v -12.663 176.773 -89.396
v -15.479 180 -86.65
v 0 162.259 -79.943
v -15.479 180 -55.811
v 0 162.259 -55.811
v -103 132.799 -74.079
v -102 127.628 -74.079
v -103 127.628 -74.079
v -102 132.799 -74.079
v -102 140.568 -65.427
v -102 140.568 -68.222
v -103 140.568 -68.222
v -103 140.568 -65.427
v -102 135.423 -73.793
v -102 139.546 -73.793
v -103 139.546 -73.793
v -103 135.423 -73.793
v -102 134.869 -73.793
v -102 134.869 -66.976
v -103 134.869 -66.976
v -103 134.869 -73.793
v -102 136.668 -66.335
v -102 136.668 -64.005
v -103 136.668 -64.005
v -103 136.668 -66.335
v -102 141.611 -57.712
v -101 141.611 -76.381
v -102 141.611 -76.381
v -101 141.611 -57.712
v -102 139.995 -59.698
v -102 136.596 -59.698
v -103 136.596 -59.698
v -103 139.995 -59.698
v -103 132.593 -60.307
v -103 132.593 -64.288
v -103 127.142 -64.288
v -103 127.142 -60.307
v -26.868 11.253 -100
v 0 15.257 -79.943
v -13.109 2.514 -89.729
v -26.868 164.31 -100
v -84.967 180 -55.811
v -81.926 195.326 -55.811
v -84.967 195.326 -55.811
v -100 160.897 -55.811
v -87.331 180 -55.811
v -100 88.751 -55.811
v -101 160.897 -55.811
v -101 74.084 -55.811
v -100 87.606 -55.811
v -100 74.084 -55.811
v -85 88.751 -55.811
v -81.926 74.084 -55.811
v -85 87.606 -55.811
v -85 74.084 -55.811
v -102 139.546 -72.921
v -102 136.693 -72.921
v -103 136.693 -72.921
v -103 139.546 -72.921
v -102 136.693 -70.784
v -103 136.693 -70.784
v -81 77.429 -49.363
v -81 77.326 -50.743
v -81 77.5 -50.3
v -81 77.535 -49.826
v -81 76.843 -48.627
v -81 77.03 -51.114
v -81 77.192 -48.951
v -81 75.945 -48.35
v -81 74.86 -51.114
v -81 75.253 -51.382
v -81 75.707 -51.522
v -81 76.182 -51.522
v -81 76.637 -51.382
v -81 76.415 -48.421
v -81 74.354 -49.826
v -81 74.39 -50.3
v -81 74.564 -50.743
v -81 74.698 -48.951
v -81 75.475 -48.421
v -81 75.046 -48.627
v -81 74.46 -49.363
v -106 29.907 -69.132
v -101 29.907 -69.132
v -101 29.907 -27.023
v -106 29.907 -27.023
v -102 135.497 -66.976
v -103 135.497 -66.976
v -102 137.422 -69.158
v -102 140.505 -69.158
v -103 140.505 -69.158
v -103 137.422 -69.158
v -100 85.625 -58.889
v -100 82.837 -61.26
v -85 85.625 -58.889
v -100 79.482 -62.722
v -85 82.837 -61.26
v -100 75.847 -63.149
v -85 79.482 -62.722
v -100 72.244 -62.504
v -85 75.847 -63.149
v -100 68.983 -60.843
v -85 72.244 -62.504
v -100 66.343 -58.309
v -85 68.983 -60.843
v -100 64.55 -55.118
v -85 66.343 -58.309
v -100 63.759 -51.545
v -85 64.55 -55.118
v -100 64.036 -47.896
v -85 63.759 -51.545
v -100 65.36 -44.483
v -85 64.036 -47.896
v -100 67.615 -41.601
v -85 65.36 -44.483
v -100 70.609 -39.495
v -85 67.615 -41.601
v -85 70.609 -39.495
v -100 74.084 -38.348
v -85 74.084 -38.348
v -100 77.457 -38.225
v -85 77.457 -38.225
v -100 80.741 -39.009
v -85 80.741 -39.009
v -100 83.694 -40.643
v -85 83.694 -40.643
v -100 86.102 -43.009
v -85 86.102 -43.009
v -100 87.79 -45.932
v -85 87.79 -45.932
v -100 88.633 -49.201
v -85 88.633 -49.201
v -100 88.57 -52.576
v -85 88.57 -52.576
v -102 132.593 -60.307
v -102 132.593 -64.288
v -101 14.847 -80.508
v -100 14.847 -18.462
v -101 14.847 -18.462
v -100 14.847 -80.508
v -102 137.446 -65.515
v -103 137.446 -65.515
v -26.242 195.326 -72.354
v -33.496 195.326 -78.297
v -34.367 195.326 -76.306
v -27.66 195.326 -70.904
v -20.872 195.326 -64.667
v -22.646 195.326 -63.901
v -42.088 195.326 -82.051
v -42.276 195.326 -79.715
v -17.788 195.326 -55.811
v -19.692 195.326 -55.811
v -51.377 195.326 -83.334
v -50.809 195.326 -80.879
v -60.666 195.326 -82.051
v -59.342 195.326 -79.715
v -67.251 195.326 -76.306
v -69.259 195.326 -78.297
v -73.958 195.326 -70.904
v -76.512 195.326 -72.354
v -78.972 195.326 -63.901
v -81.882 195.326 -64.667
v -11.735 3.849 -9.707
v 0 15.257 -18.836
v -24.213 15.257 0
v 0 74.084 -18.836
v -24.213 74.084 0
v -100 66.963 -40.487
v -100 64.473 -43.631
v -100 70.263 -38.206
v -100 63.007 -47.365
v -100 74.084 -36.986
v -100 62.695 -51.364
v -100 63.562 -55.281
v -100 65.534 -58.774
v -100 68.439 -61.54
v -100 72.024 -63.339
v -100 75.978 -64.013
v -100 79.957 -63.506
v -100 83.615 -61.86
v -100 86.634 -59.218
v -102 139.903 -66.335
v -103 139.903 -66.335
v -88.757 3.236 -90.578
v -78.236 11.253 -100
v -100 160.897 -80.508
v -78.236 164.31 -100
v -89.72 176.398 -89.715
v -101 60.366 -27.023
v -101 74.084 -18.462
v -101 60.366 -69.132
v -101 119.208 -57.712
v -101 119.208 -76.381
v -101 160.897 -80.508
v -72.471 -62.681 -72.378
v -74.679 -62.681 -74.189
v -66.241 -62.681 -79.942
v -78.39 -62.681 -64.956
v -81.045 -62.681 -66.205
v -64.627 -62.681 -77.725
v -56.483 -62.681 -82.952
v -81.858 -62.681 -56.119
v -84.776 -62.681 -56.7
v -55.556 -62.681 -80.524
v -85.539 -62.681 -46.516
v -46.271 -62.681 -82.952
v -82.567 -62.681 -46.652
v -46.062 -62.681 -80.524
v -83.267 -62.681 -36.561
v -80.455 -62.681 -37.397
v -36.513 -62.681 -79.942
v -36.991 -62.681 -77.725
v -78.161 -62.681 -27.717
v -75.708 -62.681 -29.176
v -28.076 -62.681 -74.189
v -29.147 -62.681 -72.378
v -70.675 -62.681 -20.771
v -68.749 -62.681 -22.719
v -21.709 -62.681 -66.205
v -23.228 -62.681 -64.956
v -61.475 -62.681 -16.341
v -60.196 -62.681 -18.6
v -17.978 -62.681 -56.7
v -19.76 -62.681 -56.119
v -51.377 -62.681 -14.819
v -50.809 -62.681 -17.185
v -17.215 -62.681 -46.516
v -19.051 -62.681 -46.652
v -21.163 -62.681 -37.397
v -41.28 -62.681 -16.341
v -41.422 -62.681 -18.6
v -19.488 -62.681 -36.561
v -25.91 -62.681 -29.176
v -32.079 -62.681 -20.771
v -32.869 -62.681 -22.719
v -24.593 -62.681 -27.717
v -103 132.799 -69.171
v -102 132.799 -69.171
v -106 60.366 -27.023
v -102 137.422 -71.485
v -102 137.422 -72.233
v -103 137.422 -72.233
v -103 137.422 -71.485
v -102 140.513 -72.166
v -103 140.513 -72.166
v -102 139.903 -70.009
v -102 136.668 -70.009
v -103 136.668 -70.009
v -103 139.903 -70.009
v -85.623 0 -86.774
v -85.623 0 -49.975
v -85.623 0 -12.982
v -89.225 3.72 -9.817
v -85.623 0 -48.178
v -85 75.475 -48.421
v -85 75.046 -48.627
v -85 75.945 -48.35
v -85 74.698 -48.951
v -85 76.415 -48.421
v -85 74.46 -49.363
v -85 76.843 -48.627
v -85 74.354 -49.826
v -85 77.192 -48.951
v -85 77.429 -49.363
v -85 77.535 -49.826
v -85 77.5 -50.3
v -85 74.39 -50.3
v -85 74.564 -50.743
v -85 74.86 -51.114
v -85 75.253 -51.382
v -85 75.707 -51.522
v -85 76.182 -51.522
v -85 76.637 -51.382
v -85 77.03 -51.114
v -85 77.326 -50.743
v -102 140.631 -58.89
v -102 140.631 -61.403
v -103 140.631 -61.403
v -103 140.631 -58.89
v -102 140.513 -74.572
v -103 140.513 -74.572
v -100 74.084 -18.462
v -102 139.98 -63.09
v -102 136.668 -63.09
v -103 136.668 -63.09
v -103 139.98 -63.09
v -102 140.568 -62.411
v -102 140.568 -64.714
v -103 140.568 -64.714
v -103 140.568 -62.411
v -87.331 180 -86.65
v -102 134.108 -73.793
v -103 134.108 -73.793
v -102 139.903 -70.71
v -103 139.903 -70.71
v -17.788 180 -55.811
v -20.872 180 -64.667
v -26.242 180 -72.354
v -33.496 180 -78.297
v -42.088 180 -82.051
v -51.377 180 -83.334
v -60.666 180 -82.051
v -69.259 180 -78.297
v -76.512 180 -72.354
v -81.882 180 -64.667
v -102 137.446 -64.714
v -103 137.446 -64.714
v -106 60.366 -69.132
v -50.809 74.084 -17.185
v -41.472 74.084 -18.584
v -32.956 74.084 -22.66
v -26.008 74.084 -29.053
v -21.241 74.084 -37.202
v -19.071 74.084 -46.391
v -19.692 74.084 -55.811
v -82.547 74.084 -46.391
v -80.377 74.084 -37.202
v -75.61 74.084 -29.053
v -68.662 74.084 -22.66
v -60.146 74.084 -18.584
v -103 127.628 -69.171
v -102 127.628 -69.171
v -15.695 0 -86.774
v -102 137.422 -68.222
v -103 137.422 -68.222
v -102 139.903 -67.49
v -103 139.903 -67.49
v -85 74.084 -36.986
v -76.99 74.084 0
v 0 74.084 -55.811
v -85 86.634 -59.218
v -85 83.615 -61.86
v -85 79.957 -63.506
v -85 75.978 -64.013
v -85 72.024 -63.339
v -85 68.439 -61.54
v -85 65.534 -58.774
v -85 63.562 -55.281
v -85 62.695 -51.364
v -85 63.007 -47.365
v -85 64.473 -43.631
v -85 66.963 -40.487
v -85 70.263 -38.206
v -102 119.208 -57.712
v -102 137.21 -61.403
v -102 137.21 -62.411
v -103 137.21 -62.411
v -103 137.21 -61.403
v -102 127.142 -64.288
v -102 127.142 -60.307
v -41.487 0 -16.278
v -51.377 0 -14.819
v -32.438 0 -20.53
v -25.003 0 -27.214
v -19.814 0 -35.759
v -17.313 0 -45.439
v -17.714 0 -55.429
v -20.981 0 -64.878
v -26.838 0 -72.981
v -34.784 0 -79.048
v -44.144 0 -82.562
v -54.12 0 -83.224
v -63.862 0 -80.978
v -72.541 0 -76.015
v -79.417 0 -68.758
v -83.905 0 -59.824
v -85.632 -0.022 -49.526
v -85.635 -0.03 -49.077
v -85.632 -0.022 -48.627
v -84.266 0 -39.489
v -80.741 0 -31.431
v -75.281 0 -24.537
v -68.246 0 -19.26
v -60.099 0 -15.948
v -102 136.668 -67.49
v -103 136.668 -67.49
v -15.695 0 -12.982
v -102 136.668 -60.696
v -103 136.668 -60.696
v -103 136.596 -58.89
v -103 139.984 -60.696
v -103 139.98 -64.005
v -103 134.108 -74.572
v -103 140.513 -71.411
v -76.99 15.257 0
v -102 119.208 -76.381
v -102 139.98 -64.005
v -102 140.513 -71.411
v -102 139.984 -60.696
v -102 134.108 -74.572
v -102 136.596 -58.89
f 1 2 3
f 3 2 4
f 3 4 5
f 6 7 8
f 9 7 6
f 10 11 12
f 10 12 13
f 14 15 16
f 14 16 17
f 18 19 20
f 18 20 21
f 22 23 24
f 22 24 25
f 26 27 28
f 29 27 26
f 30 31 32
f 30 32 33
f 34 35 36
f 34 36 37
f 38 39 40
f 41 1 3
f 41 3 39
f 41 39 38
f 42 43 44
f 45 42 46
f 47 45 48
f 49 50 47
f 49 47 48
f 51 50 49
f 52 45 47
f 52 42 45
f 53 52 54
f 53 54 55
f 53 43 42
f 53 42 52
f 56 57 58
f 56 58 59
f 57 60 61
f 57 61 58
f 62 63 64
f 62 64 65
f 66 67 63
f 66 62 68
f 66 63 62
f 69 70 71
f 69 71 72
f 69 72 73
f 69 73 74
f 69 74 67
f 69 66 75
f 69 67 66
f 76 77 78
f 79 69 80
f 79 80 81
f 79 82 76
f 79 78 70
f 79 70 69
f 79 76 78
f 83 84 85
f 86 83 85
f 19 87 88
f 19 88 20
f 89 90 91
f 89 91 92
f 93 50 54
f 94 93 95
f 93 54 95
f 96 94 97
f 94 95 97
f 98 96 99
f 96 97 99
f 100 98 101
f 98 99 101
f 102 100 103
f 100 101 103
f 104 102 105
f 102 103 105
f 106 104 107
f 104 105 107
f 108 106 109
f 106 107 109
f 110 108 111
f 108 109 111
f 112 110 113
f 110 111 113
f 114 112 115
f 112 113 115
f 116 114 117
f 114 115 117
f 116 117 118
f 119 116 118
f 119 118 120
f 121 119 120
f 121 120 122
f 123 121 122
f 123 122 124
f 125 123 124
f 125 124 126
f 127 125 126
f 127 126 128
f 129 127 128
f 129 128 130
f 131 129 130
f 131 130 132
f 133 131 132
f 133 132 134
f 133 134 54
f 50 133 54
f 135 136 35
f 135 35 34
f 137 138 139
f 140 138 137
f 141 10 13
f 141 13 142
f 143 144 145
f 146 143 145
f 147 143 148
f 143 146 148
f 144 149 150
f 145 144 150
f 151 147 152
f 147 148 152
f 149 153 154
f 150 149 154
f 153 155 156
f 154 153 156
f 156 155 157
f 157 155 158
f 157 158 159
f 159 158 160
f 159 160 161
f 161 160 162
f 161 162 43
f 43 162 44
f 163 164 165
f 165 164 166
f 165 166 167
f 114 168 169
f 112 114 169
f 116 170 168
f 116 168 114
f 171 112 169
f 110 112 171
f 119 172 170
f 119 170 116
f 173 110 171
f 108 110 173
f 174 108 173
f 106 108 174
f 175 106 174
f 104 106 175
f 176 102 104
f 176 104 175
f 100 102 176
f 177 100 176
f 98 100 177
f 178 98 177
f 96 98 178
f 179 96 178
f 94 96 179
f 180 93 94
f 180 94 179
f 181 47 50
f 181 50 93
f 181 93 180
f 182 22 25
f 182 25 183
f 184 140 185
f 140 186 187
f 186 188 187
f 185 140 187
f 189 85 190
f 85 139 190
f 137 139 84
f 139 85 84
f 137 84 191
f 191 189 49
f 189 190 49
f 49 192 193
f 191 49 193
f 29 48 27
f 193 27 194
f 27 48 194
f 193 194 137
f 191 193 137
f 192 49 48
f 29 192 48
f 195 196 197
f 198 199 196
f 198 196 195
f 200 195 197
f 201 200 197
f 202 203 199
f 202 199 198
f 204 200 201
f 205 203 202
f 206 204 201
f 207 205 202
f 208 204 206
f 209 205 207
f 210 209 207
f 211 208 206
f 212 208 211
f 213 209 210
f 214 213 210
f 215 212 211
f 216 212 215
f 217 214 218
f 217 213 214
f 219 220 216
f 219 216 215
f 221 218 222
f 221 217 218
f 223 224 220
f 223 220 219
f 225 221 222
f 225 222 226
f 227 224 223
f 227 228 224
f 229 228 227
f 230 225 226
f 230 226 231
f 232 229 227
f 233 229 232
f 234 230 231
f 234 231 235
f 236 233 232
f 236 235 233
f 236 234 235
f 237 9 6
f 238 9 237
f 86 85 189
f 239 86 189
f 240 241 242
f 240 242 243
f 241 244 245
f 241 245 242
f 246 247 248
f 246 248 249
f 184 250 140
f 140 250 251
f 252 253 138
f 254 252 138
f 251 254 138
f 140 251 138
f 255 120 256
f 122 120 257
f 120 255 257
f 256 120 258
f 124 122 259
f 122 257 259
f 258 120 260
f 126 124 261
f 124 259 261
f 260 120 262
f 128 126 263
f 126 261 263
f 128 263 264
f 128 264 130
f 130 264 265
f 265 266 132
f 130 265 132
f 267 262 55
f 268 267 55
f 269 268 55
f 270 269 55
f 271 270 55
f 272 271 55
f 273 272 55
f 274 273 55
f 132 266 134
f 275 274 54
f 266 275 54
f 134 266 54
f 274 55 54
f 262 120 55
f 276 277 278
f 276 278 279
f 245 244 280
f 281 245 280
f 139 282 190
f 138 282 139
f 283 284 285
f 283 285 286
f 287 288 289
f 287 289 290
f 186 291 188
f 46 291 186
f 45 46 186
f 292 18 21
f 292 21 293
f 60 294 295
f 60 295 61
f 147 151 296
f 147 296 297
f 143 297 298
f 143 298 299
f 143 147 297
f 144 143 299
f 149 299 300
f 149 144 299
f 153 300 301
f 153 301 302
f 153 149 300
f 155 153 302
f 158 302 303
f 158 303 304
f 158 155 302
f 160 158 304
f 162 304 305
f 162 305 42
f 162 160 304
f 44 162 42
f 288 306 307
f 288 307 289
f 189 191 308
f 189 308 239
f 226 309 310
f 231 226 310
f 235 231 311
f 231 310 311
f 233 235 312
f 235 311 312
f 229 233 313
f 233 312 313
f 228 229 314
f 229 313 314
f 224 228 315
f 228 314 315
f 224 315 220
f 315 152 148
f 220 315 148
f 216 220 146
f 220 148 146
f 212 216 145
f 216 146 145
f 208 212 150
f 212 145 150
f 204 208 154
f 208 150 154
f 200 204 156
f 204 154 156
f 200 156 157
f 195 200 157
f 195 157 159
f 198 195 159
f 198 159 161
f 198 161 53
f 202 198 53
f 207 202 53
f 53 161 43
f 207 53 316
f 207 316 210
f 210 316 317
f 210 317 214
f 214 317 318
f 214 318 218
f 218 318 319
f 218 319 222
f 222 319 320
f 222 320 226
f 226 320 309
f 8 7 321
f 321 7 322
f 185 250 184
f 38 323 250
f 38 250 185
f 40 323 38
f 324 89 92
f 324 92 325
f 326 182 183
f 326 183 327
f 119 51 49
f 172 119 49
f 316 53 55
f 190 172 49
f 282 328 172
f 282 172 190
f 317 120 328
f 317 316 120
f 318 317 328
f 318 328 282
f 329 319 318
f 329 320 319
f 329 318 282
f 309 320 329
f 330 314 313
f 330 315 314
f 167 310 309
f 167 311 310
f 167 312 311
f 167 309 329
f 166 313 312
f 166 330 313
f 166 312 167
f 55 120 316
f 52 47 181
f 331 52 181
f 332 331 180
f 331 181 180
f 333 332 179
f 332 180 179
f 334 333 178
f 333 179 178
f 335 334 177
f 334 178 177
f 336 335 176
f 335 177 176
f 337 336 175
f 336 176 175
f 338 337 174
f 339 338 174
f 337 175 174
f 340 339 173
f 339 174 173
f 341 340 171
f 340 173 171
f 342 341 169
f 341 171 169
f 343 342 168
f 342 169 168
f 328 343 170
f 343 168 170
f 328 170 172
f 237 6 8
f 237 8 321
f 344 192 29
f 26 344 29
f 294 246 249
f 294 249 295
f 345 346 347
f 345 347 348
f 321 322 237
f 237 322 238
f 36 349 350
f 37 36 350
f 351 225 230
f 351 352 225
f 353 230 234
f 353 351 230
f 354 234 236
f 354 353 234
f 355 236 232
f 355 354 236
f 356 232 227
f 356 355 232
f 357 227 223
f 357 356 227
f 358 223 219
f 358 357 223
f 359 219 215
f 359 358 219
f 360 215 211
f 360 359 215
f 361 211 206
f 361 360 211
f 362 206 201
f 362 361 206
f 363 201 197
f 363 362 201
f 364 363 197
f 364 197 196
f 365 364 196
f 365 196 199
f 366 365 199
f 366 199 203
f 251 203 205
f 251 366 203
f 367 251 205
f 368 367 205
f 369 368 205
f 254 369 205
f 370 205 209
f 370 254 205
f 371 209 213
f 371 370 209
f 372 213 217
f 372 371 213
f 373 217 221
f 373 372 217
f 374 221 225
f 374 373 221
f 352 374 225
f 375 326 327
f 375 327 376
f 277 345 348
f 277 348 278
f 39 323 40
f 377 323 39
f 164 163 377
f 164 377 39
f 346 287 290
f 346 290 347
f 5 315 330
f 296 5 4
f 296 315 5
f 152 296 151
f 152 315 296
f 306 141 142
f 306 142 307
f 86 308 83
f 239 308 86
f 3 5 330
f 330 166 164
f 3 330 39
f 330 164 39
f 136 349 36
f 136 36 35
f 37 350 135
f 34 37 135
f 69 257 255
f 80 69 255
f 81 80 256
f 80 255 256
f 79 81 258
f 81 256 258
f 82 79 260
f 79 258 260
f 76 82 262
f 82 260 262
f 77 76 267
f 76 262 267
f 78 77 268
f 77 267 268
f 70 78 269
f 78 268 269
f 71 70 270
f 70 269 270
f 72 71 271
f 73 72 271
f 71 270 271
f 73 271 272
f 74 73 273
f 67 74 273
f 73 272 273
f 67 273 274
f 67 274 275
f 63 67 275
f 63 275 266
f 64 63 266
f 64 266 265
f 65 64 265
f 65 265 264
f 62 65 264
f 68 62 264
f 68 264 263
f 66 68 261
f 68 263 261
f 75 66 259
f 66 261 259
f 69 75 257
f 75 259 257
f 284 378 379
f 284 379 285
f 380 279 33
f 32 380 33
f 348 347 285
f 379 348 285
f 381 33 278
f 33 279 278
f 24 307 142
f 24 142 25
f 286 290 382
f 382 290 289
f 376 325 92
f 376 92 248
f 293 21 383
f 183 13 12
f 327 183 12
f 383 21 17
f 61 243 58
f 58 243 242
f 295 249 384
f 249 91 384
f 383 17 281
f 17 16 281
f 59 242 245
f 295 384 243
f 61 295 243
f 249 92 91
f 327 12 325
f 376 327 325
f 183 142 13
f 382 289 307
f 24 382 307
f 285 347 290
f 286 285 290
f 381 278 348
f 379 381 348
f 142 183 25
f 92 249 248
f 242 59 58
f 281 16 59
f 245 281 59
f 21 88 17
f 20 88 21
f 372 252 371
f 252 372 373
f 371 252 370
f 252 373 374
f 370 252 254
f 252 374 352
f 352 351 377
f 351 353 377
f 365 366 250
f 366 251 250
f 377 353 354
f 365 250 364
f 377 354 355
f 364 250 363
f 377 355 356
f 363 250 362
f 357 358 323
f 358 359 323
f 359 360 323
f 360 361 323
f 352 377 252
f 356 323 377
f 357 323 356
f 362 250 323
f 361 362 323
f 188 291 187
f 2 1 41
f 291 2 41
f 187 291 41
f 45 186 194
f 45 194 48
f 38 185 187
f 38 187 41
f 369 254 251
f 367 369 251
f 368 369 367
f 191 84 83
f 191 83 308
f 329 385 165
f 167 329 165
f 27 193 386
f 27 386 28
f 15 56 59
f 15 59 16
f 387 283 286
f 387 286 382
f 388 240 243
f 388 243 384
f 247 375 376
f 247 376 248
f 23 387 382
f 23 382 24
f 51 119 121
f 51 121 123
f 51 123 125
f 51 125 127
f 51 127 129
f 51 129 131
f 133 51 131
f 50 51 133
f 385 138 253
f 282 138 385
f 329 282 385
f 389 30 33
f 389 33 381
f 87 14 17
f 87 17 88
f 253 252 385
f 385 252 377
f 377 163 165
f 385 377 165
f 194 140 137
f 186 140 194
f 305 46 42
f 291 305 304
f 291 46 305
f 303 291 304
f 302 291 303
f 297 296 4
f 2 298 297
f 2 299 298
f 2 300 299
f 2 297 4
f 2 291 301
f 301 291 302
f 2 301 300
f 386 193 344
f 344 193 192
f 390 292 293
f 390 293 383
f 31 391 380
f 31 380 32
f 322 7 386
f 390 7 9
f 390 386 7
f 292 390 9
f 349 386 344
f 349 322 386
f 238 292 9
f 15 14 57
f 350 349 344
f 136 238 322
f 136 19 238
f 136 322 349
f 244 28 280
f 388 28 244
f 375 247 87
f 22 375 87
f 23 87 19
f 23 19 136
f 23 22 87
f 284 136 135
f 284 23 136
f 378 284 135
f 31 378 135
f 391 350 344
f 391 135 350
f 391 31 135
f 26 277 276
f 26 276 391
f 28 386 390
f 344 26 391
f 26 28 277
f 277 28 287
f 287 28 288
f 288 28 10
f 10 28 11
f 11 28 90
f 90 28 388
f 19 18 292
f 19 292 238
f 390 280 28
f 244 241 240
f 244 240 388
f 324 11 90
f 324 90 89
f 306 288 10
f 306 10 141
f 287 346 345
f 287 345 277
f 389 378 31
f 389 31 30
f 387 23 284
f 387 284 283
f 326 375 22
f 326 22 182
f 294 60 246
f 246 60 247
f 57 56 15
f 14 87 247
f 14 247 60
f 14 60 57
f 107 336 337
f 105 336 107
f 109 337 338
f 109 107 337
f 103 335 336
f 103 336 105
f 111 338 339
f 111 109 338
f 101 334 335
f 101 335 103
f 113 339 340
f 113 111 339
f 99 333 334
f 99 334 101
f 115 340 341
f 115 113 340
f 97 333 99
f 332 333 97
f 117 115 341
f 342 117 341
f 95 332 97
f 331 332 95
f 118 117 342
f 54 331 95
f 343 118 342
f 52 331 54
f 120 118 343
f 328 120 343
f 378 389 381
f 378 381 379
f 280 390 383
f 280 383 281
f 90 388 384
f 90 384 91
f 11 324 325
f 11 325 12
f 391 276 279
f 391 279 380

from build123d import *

# Parameters (mm, degrees)
SKETCH1_W           = 100
SKETCH1_H           = 100
BOSS_EXTRUDE1_DEPTH = 180
SKETCH2_R           = 34.257790197
BOSS_EXTRUDE2_DEPTH = 350
SKETCH3_W           = 152.006357392
SKETCH3_H           = 282.452416457
CUT_EXTRUDE2_DEPTH  = 400
CUT_EXTRUDE3_DEPTH  = 400
CUT_EXTRUDE4_DEPTH  = 400
CUT_EXTRUDE5_DEPTH  = 400
SKETCH7_W           = 160.159381639
SKETCH7_H           = 147.362276113
CUT_EXTRUDE6_DEPTH  = 400
SKETCH8_W           = 147.310744502
SKETCH8_H           = 162.038906966
CUT_EXTRUDE7_DEPTH  = 400
SKETCH9_R           = 31.847293423
CUT_EXTRUDE8_DEPTH  = 400
SKETCH10_W          = 140.220962397
SKETCH10_H          = 212.033531124
CUT_EXTRUDE9_DEPTH  = 400
SKETCH11_R          = 13.603137886
CUT_EXTRUDE11_DEPTH = 15
SKETCH12_R          = 12.495422516
BOSS_EXTRUDE3_DEPTH = 15
SKETCH13_R          = 1.594865099
BOSS_EXTRUDE4_DEPTH = 4
SKETCH14_W          = 100.74862993
SKETCH14_H          = 110.555003588
CUT_EXTRUDE13_DEPTH = 400
BOSS_EXTRUDE5_DEPTH = 1
SKETCH16_W          = 42.108585165
SKETCH16_H          = 30.458347221
BOSS_EXTRUDE6_DEPTH = 5
SKETCH17_W          = 18.669530869
SKETCH17_H          = 22.4027039
BOSS_EXTRUDE7_DEPTH = 1
SKETCH18_W          = 4.907623399
SKETCH18_H          = 5.170746831
SKETCH18_W_2        = 3.981473695
SKETCH18_H_2        = 5.451349552
BOSS_EXTRUDE8_DEPTH = 1
BOSS_EXTRUDE9_DEPTH = 1


with BuildPart() as part:
    # Sketch1 → Boss-Extrude1 (new body)
    with BuildSketch(Plane(origin=(0, 0, 0), x_dir=(1, 0, 0), z_dir=(0, 1, 0))):
        with Locations((-50, 50)):
            Rectangle(SKETCH1_W, SKETCH1_H)
    extrude(amount=BOSS_EXTRUDE1_DEPTH)

    # Sketch2 → Boss-Extrude2 (add, symmetric)
    with BuildSketch(Plane(origin=(0, 180, 0), x_dir=(1, 0, 0), z_dir=(0, 1, 0))):
        with Locations(Location((-51.377291833, 49.076536384, 0), (0, 0, 270))):
            Circle(SKETCH2_R)
    extrude(amount=BOSS_EXTRUDE2_DEPTH, both=True)

    # Sketch3 → Cut-Extrude2 (cut)
    with BuildSketch(Plane(origin=(0, 0, 0), x_dir=(0, 0, -1), z_dir=(1, 0, 0))):
        with Locations((57.419900112, 502.274302507)):
            Rectangle(SKETCH3_W, SKETCH3_H)
    extrude(amount=-CUT_EXTRUDE2_DEPTH, mode=Mode.SUBTRACT)

    # Sketch4 → Cut-Extrude3 (cut)
    with BuildSketch(Plane(origin=(0, 0, 0), x_dir=(0, 0, -1), z_dir=(1, 0, 0))):
        Polygon((12.981970869, 0), (-8.994244796, 25.828096003), (-18.564506014, -15.259465835), align=None)
        Polygon((85.072517936, -1.448103984), (109.237639161, 19.113145112), (115.920034239, -3.267382694), align=None)
        Polygon((12.981970869, 180), (-8.994244796, 148.537596011), (-15.418178585, 193.219274892), align=None)
        Polygon((85.072517936, 181.854312784), (103.841225373, 159.795920888), (106.132549481, 198.647393934), align=None)
    extrude(amount=-CUT_EXTRUDE3_DEPTH, mode=Mode.SUBTRACT)

    # Sketch5 → Cut-Extrude4 (cut)
    with BuildSketch(Plane.XY):
        Polygon((-85.623287335, 0), (-106.370377984, 21.426392531), (-122.288861874, 3.209259887), (-93.526345261, -19.884701759), align=None)
        Polygon((-15.694988751, 0), (0, 15.257385304), (12.122677088, 15.257385304), (10.563067769, -19.884701759), align=None)
        Polygon((-87.166490339, 180.248071029), (-106.370377984, 151.29108453), (-117.705469457, 200.501115102), align=None)
        Polygon((-15.694988751, 180.248071029), (7.833767065, 153.279557508), (0, 193.941208308), align=None)
    extrude(amount=-CUT_EXTRUDE4_DEPTH, mode=Mode.SUBTRACT)

    # Sketch6 → Cut-Extrude5 (cut)
    with BuildSketch(Plane(origin=(0, 180, 0), x_dir=(1, 0, 0), z_dir=(0, 1, 0))):
        Polygon((-112.386997555, 28.400400964), (-64.261264503, -10.212759359), (-84.406366528, -15.51192827), (-124.649689542, -15.51192827), align=None)
        Polygon((-97.065537028, 135.861756084), (-119.37552445, 77.792688888), (-118.043343626, 64.347606737), (-66.428694172, 110.575168787), align=None)
        Polygon((-24.69640689, -21.815840769), (11.092108798, -8.97361337), (17.428316417, 32.393768119), (-38.531576846, -11.139157378), align=None)
        Polygon((-17.445484601, 140.804394854), (35.417473102, 107.262520599), (9.305452855, 72.996438725), (-31.724385352, 103.625272537), align=None)
    extrude(amount=-CUT_EXTRUDE5_DEPTH, mode=Mode.SUBTRACT)

    # Sketch7 → Cut-Extrude6 (cut)
    with BuildSketch(Plane.XY):
        with Locations((-66.123258915, -136.36252694)):
            Rectangle(SKETCH7_W, SKETCH7_H)
    extrude(amount=-CUT_EXTRUDE6_DEPTH, mode=Mode.SUBTRACT)

    # Sketch8 → Cut-Extrude7 (cut)
    with BuildSketch(Plane.XY):
        with Locations((-53.541153336, 332.448287589)):
            Rectangle(SKETCH8_W, SKETCH8_H)
    extrude(amount=-CUT_EXTRUDE7_DEPTH, mode=Mode.SUBTRACT)

    # Sketch9 → Cut-Extrude8 (cut)
    with BuildSketch(Plane(origin=(0, 251.428834106, 0), x_dir=(1, 0, 0), z_dir=(0, 1, 0))):
        with Locations(Location((-50.808993157, 49.032036374, 0), (0, 0, 270))):
            Circle(SKETCH9_R)
    extrude(amount=-CUT_EXTRUDE8_DEPTH, mode=Mode.SUBTRACT)

    # Sketch10 → Cut-Extrude9 (cut)
    with BuildSketch(Plane.ZY.offset(100)):
        with Locations((14.299084536, 180.100625535)):
            Rectangle(SKETCH10_W, SKETCH10_H)
    extrude(amount=-CUT_EXTRUDE9_DEPTH, mode=Mode.SUBTRACT)

    # Sketch11 → Cut-Extrude11 (cut)
    with BuildSketch(Plane.ZY.offset(100)):
        with Locations((-50.413251954, 76.264646142)):
            Circle(SKETCH11_R)
    extrude(amount=-CUT_EXTRUDE11_DEPTH, mode=Mode.SUBTRACT)

    # Sketch12 → Boss-Extrude3 (add)
    with BuildSketch(Plane.ZY.offset(85)):
        with Locations(Location((-50.658800768, 76.222522328, 0), (0, 0, 114.353089558))):
            Circle(SKETCH12_R)
    extrude(amount=BOSS_EXTRUDE3_DEPTH)

    # Sketch13 → Boss-Extrude4 (add)
    with BuildSketch(Plane(origin=(-85, 0, 0), x_dir=(0, 0, -1), z_dir=(1, 0, 0))):
        with Locations(Location((49.945205578, 75.944780088, 0), (0, 0, 180))):
            Circle(SKETCH13_R)
    extrude(amount=BOSS_EXTRUDE4_DEPTH)

    # Sketch14 → Cut-Extrude13 (cut)
    with BuildSketch(Plane.ZY.offset(100)):
        with Locations((-65.350029467, 250.603414818)):
            Rectangle(SKETCH14_W, SKETCH14_H)
    extrude(amount=-CUT_EXTRUDE13_DEPTH, mode=Mode.SUBTRACT)

    # Sketch15 → Boss-Extrude5 (add)
    with BuildSketch(Plane.ZY.offset(100)):
        Polygon((-18.461827727, 14.847435435), (-80.507743362, 14.847435435), (-80.507743362, 160.896793159), (-55.811396663, 160.896793159), (-55.811396663, 74.083859973), (-18.461827727, 74.083859973), align=None)
    extrude(amount=BOSS_EXTRUDE5_DEPTH)

    # Sketch16 → Boss-Extrude6 (add)
    with BuildSketch(Plane.ZY.offset(101)):
        with Locations((-48.07732297, 45.136437142)):
            Rectangle(SKETCH16_W, SKETCH16_H)
    extrude(amount=BOSS_EXTRUDE6_DEPTH)

    # Sketch17 → Boss-Extrude7 (add)
    with BuildSketch(Plane.ZY.offset(101)):
        with Locations((-67.04663872, 130.409241603)):
            Rectangle(SKETCH17_W, SKETCH17_H)
    extrude(amount=BOSS_EXTRUDE7_DEPTH)

    # Sketch18 → Boss-Extrude8 (add)
    with BuildSketch(Plane.ZY.offset(102)):
        with Locations((-71.625108618, 130.213401885)):
            Rectangle(SKETCH18_W, SKETCH18_H)
        with Locations((-62.297675883, 129.867186512)):
            Rectangle(SKETCH18_W_2, SKETCH18_H_2)
    extrude(amount=BOSS_EXTRUDE8_DEPTH)

    # Sketch19 → Boss-Extrude9 (add)
    with BuildSketch(Plane.ZY.offset(102)):
        Polygon((-66.976455081, 134.868836652), (-73.7929295, 134.868836652), (-73.7929295, 134.108269479), (-74.571872104, 134.108269479), (-74.571872104, 140.512729543), (-73.7929295, 140.512729543), (-72.165965418, 140.512729543), (-72.233411796, 137.421948277), (-71.48458153, 137.421948277), (-71.410861795, 140.512729543), (-69.158339735, 140.504865112), (-69.158339735, 137.421948277), (-68.22174926, 137.421948277), (-68.22174926, 140.567922793), (-65.426885805, 140.567922793), (-65.515241968, 137.446210948), (-64.714122339, 137.446210948), (-64.714122339, 140.567922793), (-62.410871788, 140.567922793), (-62.410871788, 137.210126003), (-61.403493639, 137.210126003), (-61.403493639, 140.631129361), (-58.889974549, 140.631129361), (-58.889974549, 136.595539338), (-59.698319644, 136.595539338), (-59.698319644, 139.99489006), (-60.695848378, 139.984078324), (-60.695848378, 136.667717235), (-63.090112056, 136.667717235), (-63.090112056, 139.979723883), (-64.00479018, 139.979723883), (-64.00479018, 136.667717235), (-66.334605538, 136.667717235), (-66.334605538, 139.902697072), (-67.48995239, 139.902697072), (-67.48995239, 136.667717235), (-70.008746759, 136.667717235), (-70.008746759, 139.902697072), (-70.709698815, 139.902697072), (-70.783897489, 136.693128041), (-72.921241048, 136.693128041), (-72.921241048, 139.545601992), (-73.7929295, 139.545601992), (-73.7929295, 135.423339258), (-66.976455081, 135.49721976), align=None)
    extrude(amount=BOSS_EXTRUDE9_DEPTH)


solid = part.part
